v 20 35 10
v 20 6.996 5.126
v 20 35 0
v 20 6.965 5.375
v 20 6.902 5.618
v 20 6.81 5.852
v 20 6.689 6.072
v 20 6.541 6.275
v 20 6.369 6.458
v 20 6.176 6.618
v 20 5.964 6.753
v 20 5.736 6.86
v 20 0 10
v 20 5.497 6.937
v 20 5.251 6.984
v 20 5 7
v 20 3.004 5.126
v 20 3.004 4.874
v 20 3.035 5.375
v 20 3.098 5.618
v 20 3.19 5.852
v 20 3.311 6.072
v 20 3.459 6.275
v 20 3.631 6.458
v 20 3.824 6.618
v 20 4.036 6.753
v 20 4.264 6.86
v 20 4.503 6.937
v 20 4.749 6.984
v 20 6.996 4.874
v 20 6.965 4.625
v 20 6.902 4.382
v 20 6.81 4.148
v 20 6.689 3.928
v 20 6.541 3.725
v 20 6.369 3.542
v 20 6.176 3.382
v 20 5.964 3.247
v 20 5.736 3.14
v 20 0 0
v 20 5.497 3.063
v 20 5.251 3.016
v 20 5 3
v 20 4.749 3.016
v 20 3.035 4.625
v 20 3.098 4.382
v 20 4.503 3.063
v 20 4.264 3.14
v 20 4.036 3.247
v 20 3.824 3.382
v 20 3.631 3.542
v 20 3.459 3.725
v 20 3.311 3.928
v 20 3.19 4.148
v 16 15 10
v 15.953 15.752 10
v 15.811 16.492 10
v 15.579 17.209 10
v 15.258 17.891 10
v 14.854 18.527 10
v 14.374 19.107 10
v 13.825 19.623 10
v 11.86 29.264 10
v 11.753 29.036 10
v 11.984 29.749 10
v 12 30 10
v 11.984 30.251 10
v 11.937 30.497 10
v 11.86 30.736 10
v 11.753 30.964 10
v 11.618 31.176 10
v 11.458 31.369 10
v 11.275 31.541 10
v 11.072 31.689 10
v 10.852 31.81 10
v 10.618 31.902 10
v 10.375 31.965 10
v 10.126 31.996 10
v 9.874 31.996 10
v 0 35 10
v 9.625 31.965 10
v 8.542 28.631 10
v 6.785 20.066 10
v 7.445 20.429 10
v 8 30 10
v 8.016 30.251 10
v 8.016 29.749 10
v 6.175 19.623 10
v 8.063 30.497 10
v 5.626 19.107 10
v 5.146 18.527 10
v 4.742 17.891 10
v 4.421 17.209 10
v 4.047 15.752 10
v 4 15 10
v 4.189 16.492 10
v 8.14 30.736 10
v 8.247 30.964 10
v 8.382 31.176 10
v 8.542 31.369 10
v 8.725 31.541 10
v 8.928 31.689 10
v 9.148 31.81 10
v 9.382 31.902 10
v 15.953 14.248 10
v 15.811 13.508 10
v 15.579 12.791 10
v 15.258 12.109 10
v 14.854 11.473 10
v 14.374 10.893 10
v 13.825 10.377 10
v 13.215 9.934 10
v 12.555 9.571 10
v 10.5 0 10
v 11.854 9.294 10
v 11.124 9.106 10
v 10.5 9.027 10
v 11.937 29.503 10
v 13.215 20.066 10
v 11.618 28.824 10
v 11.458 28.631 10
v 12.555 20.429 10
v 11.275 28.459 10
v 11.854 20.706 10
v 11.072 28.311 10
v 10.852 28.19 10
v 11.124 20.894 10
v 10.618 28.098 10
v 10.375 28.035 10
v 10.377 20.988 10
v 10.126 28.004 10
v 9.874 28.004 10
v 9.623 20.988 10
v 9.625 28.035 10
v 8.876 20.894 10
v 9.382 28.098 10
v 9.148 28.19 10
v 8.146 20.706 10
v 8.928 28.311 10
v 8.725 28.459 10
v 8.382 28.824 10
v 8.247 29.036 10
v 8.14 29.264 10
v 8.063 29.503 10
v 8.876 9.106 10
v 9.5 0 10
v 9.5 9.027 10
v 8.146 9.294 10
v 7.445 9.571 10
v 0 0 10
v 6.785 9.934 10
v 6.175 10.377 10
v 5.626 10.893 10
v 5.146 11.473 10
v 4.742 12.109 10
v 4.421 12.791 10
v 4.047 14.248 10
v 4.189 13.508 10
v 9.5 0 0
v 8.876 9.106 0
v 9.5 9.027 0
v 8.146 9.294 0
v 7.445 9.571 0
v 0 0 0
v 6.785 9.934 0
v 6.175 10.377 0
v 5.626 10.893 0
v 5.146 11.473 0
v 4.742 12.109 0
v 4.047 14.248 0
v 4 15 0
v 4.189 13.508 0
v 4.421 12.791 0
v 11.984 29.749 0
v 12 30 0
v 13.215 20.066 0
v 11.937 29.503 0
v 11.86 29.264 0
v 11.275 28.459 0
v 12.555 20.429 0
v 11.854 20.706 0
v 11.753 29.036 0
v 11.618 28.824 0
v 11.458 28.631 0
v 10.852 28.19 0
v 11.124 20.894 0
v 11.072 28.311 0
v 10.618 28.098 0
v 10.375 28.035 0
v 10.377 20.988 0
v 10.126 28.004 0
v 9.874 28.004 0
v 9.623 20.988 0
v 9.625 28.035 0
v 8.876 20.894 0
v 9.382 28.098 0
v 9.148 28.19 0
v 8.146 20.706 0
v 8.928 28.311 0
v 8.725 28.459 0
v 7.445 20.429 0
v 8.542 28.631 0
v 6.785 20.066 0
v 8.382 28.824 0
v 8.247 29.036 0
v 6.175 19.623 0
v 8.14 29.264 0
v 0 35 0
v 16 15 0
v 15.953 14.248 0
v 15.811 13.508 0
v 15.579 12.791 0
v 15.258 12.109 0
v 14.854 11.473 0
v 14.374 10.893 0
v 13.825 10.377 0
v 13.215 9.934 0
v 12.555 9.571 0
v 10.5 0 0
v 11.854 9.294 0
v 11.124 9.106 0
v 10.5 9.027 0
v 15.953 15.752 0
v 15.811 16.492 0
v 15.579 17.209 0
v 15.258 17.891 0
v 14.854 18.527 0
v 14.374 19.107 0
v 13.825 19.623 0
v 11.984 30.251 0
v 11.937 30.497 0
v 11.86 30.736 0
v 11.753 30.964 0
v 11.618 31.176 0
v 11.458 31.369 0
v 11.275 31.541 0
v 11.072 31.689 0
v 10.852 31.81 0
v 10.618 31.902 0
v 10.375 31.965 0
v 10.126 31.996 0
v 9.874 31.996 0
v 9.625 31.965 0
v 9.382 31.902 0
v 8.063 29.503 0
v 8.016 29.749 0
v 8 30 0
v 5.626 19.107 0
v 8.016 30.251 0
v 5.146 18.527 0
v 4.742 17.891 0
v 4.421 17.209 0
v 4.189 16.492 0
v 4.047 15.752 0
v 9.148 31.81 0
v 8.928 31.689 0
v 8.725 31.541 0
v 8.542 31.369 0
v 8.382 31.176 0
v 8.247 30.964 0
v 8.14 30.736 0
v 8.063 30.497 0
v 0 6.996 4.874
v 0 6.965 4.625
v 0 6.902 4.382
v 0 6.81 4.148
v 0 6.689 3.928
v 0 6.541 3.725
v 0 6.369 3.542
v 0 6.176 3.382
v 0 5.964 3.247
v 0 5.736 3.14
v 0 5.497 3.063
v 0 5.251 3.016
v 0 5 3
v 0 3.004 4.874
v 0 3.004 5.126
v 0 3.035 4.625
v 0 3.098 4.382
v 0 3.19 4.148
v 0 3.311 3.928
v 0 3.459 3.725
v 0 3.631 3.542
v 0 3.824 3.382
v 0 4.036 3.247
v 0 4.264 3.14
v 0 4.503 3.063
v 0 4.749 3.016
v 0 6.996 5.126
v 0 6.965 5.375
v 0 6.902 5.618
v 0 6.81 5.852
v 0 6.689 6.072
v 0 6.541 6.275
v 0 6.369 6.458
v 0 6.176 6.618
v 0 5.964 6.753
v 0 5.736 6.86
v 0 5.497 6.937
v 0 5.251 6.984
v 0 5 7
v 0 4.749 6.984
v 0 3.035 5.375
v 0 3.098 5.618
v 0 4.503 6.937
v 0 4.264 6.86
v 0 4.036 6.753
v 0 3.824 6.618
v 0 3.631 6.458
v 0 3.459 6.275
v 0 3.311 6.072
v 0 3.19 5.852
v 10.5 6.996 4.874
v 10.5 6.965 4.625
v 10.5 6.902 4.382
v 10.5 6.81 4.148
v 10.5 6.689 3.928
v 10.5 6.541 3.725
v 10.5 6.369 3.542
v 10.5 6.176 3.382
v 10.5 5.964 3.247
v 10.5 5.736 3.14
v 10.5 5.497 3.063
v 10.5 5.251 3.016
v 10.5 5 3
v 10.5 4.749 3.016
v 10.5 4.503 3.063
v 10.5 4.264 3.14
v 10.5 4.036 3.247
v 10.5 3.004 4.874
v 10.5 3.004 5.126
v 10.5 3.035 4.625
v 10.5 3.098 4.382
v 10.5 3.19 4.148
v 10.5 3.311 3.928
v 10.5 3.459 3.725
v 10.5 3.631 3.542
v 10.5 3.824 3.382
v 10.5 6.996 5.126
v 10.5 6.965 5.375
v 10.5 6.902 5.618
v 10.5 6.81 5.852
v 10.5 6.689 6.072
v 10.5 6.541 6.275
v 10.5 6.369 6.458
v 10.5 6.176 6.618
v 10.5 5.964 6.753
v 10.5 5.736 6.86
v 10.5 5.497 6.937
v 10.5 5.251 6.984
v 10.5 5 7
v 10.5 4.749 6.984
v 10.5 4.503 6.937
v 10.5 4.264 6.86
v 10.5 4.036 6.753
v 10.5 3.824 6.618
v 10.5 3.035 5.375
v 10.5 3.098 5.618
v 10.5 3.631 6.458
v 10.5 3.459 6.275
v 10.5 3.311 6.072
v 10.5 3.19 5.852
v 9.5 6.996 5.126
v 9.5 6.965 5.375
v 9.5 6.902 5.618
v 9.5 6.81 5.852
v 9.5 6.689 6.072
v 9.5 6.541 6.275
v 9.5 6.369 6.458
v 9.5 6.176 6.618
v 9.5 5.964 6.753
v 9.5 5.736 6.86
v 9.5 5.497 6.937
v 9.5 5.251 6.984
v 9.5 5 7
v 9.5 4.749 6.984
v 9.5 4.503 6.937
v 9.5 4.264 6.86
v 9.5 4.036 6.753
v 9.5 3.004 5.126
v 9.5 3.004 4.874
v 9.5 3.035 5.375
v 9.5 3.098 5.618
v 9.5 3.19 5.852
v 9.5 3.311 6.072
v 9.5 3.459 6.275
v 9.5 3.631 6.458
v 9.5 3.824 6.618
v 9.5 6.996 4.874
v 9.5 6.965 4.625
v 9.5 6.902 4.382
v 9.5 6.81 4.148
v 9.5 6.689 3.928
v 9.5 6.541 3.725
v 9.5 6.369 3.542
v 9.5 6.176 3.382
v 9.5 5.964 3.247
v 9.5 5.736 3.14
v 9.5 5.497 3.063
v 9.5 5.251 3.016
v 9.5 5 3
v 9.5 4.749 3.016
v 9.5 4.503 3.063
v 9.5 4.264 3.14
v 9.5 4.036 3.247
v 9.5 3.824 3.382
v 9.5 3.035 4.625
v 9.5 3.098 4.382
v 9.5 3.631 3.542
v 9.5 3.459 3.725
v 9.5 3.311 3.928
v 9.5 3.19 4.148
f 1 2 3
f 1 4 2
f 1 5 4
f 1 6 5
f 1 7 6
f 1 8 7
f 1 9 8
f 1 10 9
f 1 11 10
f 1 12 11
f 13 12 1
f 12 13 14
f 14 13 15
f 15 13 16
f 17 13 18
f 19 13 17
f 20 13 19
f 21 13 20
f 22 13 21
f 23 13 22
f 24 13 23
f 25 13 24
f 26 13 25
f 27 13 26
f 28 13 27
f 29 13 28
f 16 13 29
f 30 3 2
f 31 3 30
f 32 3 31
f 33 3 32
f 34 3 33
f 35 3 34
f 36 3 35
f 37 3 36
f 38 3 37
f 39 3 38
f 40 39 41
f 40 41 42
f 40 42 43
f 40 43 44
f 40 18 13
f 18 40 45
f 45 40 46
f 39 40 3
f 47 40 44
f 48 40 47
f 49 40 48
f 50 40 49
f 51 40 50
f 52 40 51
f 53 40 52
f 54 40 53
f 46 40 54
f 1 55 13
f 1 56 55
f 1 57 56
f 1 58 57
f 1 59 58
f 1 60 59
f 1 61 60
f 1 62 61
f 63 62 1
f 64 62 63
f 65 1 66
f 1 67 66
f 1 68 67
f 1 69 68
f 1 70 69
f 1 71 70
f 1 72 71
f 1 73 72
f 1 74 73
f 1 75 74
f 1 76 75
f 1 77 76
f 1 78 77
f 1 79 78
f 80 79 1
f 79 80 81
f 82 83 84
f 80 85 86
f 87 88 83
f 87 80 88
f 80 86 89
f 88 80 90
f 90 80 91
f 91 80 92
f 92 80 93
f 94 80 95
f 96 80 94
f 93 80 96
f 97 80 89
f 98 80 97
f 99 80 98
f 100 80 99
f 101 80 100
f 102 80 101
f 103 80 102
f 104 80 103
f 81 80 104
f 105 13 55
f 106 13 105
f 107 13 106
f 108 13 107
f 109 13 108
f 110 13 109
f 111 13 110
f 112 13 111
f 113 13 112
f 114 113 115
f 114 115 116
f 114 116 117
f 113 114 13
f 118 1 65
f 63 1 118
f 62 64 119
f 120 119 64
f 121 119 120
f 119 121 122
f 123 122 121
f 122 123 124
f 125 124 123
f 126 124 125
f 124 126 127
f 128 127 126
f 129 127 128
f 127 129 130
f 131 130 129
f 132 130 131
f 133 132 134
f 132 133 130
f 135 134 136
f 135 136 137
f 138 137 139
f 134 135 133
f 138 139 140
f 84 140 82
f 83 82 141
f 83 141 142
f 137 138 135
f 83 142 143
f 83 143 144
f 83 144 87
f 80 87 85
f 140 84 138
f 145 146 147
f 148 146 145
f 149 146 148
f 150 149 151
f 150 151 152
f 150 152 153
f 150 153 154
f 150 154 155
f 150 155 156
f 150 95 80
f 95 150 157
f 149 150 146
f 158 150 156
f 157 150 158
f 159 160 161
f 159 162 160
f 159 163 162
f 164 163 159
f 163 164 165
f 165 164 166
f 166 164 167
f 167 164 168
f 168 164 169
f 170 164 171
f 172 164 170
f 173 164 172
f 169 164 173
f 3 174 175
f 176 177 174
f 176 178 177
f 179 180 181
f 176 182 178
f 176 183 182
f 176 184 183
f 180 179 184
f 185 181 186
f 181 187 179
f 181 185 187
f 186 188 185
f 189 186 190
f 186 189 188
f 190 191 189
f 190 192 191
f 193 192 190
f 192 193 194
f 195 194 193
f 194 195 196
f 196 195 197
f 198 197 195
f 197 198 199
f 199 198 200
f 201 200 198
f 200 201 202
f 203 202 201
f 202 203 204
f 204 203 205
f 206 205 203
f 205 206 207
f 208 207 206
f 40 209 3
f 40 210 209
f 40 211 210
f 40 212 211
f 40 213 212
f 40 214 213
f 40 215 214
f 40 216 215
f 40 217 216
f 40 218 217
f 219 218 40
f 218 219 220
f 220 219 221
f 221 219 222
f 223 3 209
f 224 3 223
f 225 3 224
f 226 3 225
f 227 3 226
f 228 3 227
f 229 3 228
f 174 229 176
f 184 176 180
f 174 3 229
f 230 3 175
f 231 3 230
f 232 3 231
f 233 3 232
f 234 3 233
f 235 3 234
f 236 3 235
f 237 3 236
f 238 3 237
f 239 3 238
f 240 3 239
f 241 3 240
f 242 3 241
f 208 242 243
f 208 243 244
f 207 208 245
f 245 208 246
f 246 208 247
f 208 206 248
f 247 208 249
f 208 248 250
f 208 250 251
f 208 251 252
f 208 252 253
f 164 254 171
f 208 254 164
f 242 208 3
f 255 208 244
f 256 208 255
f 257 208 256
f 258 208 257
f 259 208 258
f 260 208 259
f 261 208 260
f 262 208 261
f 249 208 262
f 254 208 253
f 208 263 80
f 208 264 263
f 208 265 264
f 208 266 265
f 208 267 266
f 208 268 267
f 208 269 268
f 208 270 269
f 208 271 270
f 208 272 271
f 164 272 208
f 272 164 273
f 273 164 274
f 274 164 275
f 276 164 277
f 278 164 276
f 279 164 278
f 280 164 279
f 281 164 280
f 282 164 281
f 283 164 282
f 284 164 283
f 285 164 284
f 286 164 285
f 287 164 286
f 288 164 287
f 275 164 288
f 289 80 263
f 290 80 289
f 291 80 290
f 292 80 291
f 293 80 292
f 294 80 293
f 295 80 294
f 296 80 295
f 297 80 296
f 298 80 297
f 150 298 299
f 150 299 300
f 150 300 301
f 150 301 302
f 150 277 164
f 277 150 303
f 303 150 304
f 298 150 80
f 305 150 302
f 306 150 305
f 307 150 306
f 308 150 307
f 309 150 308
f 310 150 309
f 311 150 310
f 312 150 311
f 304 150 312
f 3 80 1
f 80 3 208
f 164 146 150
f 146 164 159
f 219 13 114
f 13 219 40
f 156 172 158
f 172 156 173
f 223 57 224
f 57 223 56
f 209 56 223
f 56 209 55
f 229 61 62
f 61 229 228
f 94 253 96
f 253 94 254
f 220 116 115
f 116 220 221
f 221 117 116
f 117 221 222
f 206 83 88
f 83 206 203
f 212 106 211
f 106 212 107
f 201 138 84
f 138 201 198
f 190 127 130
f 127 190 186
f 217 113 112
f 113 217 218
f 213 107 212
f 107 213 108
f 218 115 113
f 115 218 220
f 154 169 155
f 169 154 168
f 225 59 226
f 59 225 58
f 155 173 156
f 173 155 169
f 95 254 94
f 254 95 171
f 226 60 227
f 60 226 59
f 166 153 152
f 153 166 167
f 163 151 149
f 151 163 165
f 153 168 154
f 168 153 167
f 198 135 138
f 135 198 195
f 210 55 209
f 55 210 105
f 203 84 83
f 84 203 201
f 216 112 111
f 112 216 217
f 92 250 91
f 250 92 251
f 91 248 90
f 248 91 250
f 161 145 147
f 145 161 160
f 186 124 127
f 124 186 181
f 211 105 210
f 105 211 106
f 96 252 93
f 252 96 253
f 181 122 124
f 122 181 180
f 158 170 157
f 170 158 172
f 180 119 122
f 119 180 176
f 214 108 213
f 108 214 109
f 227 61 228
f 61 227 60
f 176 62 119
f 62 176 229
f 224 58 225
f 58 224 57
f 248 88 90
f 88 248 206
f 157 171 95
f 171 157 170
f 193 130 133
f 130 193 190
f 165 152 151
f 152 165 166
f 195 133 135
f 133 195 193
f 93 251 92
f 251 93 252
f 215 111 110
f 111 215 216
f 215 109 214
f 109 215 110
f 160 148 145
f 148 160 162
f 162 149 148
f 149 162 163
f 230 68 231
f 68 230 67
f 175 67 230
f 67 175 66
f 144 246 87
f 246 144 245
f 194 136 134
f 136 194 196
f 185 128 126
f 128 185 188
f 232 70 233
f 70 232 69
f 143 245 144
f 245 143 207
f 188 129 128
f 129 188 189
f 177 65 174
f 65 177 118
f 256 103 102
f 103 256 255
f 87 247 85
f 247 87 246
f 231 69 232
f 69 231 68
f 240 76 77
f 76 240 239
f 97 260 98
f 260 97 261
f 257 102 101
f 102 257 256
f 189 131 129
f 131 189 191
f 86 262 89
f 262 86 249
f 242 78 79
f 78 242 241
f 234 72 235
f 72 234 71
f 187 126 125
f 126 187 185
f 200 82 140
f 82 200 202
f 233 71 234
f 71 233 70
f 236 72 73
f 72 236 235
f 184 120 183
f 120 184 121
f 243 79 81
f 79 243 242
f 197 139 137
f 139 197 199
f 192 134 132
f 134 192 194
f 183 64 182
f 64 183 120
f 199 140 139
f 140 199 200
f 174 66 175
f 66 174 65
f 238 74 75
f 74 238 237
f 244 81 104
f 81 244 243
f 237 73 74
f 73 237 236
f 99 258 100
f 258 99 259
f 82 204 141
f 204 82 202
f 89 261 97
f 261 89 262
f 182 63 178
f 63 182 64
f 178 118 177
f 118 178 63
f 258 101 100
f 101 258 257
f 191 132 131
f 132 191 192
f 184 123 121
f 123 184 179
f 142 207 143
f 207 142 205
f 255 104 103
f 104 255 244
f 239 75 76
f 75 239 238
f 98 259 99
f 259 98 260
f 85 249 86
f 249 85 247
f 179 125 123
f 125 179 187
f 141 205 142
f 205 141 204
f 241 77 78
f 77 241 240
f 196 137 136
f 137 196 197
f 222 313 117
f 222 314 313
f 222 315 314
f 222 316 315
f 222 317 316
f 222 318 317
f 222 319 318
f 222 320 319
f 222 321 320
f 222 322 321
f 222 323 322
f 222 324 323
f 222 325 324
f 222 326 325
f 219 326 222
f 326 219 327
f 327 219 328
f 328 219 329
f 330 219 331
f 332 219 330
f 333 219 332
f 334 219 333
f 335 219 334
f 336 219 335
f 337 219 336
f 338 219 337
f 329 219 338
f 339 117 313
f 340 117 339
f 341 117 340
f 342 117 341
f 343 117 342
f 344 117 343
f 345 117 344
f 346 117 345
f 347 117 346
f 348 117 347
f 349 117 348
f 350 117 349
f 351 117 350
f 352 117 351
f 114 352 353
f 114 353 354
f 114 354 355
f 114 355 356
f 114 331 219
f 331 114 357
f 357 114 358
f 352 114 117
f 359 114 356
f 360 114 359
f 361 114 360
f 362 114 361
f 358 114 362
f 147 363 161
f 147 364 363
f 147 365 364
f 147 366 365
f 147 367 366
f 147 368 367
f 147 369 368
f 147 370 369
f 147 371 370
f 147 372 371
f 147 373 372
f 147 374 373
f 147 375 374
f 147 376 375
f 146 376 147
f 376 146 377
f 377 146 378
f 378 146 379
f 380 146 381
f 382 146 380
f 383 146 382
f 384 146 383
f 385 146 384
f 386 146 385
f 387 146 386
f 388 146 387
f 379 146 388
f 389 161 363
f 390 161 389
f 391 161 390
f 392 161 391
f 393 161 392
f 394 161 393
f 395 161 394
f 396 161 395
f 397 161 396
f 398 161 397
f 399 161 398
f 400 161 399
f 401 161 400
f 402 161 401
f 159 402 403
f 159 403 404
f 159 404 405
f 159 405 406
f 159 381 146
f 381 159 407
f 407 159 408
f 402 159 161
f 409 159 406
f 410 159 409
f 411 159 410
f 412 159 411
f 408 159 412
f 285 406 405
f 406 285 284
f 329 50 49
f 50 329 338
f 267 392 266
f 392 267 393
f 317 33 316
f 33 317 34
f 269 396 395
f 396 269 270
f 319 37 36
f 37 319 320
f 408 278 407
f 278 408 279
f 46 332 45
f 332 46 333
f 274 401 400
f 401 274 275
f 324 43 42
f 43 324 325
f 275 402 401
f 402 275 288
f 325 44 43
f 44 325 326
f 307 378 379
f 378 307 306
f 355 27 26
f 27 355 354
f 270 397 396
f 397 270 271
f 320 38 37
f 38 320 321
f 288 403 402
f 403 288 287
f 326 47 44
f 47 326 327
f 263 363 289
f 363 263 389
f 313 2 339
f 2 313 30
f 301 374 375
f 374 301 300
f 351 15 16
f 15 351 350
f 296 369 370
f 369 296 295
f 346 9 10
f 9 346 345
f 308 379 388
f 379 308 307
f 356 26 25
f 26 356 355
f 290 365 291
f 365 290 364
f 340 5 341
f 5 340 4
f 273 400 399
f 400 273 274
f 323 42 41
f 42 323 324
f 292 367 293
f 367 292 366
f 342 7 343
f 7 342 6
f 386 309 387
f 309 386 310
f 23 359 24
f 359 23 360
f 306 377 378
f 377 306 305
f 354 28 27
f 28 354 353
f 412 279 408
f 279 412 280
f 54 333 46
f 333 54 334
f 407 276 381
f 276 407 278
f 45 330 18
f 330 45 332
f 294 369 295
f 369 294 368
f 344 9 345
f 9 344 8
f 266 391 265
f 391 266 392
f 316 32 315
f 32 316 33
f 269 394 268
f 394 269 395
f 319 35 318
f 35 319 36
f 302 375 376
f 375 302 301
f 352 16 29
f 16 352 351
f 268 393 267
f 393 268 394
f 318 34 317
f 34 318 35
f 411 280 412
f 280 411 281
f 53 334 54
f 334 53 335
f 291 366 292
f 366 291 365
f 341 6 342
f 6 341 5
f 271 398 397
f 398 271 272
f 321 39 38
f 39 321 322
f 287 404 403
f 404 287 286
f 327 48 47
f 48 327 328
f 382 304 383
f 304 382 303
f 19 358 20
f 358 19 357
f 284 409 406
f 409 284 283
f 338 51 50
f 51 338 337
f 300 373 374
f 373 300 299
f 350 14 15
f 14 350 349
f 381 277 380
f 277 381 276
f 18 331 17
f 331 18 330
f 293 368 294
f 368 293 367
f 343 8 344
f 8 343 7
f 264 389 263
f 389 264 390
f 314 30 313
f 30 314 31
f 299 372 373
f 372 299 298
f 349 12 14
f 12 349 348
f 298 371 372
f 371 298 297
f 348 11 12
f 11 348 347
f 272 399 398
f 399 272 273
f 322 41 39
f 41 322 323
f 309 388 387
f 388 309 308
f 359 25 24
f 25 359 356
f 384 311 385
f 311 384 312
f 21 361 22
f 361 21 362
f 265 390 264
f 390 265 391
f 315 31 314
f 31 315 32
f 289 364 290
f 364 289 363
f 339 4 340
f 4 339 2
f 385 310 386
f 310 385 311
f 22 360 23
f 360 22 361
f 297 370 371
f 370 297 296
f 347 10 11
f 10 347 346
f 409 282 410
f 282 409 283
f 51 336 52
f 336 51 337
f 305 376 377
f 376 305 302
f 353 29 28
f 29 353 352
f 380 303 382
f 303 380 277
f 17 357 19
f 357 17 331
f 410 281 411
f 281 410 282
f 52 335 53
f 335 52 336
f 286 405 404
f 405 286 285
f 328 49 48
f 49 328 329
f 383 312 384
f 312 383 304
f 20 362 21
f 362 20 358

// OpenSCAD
r_laser=6;
r_m3=2;
hauteur=10;

module support_laser(){
	difference(){
		cube([20,35,hauteur]);
		
		//trou pour le laser
		translate([10,15,-5]){cylinder(h=hauteur+10, r=r_laser, $fn=50);}

		//trou pour fixation sur chariot X
		translate([10,30,-5]){cylinder(h=hauteur+10, r=r_m3, $fn=50);}

		//fente pour le serrage du laser
		translate([9.5,-5,-5]){cube([1,20,hauteur+10]);}
		translate([-5,5,hauteur/2]){rotate([0,90,0])cylinder(h=50, r=r_m3, $fn=50);}


	}
}

support_laser();
